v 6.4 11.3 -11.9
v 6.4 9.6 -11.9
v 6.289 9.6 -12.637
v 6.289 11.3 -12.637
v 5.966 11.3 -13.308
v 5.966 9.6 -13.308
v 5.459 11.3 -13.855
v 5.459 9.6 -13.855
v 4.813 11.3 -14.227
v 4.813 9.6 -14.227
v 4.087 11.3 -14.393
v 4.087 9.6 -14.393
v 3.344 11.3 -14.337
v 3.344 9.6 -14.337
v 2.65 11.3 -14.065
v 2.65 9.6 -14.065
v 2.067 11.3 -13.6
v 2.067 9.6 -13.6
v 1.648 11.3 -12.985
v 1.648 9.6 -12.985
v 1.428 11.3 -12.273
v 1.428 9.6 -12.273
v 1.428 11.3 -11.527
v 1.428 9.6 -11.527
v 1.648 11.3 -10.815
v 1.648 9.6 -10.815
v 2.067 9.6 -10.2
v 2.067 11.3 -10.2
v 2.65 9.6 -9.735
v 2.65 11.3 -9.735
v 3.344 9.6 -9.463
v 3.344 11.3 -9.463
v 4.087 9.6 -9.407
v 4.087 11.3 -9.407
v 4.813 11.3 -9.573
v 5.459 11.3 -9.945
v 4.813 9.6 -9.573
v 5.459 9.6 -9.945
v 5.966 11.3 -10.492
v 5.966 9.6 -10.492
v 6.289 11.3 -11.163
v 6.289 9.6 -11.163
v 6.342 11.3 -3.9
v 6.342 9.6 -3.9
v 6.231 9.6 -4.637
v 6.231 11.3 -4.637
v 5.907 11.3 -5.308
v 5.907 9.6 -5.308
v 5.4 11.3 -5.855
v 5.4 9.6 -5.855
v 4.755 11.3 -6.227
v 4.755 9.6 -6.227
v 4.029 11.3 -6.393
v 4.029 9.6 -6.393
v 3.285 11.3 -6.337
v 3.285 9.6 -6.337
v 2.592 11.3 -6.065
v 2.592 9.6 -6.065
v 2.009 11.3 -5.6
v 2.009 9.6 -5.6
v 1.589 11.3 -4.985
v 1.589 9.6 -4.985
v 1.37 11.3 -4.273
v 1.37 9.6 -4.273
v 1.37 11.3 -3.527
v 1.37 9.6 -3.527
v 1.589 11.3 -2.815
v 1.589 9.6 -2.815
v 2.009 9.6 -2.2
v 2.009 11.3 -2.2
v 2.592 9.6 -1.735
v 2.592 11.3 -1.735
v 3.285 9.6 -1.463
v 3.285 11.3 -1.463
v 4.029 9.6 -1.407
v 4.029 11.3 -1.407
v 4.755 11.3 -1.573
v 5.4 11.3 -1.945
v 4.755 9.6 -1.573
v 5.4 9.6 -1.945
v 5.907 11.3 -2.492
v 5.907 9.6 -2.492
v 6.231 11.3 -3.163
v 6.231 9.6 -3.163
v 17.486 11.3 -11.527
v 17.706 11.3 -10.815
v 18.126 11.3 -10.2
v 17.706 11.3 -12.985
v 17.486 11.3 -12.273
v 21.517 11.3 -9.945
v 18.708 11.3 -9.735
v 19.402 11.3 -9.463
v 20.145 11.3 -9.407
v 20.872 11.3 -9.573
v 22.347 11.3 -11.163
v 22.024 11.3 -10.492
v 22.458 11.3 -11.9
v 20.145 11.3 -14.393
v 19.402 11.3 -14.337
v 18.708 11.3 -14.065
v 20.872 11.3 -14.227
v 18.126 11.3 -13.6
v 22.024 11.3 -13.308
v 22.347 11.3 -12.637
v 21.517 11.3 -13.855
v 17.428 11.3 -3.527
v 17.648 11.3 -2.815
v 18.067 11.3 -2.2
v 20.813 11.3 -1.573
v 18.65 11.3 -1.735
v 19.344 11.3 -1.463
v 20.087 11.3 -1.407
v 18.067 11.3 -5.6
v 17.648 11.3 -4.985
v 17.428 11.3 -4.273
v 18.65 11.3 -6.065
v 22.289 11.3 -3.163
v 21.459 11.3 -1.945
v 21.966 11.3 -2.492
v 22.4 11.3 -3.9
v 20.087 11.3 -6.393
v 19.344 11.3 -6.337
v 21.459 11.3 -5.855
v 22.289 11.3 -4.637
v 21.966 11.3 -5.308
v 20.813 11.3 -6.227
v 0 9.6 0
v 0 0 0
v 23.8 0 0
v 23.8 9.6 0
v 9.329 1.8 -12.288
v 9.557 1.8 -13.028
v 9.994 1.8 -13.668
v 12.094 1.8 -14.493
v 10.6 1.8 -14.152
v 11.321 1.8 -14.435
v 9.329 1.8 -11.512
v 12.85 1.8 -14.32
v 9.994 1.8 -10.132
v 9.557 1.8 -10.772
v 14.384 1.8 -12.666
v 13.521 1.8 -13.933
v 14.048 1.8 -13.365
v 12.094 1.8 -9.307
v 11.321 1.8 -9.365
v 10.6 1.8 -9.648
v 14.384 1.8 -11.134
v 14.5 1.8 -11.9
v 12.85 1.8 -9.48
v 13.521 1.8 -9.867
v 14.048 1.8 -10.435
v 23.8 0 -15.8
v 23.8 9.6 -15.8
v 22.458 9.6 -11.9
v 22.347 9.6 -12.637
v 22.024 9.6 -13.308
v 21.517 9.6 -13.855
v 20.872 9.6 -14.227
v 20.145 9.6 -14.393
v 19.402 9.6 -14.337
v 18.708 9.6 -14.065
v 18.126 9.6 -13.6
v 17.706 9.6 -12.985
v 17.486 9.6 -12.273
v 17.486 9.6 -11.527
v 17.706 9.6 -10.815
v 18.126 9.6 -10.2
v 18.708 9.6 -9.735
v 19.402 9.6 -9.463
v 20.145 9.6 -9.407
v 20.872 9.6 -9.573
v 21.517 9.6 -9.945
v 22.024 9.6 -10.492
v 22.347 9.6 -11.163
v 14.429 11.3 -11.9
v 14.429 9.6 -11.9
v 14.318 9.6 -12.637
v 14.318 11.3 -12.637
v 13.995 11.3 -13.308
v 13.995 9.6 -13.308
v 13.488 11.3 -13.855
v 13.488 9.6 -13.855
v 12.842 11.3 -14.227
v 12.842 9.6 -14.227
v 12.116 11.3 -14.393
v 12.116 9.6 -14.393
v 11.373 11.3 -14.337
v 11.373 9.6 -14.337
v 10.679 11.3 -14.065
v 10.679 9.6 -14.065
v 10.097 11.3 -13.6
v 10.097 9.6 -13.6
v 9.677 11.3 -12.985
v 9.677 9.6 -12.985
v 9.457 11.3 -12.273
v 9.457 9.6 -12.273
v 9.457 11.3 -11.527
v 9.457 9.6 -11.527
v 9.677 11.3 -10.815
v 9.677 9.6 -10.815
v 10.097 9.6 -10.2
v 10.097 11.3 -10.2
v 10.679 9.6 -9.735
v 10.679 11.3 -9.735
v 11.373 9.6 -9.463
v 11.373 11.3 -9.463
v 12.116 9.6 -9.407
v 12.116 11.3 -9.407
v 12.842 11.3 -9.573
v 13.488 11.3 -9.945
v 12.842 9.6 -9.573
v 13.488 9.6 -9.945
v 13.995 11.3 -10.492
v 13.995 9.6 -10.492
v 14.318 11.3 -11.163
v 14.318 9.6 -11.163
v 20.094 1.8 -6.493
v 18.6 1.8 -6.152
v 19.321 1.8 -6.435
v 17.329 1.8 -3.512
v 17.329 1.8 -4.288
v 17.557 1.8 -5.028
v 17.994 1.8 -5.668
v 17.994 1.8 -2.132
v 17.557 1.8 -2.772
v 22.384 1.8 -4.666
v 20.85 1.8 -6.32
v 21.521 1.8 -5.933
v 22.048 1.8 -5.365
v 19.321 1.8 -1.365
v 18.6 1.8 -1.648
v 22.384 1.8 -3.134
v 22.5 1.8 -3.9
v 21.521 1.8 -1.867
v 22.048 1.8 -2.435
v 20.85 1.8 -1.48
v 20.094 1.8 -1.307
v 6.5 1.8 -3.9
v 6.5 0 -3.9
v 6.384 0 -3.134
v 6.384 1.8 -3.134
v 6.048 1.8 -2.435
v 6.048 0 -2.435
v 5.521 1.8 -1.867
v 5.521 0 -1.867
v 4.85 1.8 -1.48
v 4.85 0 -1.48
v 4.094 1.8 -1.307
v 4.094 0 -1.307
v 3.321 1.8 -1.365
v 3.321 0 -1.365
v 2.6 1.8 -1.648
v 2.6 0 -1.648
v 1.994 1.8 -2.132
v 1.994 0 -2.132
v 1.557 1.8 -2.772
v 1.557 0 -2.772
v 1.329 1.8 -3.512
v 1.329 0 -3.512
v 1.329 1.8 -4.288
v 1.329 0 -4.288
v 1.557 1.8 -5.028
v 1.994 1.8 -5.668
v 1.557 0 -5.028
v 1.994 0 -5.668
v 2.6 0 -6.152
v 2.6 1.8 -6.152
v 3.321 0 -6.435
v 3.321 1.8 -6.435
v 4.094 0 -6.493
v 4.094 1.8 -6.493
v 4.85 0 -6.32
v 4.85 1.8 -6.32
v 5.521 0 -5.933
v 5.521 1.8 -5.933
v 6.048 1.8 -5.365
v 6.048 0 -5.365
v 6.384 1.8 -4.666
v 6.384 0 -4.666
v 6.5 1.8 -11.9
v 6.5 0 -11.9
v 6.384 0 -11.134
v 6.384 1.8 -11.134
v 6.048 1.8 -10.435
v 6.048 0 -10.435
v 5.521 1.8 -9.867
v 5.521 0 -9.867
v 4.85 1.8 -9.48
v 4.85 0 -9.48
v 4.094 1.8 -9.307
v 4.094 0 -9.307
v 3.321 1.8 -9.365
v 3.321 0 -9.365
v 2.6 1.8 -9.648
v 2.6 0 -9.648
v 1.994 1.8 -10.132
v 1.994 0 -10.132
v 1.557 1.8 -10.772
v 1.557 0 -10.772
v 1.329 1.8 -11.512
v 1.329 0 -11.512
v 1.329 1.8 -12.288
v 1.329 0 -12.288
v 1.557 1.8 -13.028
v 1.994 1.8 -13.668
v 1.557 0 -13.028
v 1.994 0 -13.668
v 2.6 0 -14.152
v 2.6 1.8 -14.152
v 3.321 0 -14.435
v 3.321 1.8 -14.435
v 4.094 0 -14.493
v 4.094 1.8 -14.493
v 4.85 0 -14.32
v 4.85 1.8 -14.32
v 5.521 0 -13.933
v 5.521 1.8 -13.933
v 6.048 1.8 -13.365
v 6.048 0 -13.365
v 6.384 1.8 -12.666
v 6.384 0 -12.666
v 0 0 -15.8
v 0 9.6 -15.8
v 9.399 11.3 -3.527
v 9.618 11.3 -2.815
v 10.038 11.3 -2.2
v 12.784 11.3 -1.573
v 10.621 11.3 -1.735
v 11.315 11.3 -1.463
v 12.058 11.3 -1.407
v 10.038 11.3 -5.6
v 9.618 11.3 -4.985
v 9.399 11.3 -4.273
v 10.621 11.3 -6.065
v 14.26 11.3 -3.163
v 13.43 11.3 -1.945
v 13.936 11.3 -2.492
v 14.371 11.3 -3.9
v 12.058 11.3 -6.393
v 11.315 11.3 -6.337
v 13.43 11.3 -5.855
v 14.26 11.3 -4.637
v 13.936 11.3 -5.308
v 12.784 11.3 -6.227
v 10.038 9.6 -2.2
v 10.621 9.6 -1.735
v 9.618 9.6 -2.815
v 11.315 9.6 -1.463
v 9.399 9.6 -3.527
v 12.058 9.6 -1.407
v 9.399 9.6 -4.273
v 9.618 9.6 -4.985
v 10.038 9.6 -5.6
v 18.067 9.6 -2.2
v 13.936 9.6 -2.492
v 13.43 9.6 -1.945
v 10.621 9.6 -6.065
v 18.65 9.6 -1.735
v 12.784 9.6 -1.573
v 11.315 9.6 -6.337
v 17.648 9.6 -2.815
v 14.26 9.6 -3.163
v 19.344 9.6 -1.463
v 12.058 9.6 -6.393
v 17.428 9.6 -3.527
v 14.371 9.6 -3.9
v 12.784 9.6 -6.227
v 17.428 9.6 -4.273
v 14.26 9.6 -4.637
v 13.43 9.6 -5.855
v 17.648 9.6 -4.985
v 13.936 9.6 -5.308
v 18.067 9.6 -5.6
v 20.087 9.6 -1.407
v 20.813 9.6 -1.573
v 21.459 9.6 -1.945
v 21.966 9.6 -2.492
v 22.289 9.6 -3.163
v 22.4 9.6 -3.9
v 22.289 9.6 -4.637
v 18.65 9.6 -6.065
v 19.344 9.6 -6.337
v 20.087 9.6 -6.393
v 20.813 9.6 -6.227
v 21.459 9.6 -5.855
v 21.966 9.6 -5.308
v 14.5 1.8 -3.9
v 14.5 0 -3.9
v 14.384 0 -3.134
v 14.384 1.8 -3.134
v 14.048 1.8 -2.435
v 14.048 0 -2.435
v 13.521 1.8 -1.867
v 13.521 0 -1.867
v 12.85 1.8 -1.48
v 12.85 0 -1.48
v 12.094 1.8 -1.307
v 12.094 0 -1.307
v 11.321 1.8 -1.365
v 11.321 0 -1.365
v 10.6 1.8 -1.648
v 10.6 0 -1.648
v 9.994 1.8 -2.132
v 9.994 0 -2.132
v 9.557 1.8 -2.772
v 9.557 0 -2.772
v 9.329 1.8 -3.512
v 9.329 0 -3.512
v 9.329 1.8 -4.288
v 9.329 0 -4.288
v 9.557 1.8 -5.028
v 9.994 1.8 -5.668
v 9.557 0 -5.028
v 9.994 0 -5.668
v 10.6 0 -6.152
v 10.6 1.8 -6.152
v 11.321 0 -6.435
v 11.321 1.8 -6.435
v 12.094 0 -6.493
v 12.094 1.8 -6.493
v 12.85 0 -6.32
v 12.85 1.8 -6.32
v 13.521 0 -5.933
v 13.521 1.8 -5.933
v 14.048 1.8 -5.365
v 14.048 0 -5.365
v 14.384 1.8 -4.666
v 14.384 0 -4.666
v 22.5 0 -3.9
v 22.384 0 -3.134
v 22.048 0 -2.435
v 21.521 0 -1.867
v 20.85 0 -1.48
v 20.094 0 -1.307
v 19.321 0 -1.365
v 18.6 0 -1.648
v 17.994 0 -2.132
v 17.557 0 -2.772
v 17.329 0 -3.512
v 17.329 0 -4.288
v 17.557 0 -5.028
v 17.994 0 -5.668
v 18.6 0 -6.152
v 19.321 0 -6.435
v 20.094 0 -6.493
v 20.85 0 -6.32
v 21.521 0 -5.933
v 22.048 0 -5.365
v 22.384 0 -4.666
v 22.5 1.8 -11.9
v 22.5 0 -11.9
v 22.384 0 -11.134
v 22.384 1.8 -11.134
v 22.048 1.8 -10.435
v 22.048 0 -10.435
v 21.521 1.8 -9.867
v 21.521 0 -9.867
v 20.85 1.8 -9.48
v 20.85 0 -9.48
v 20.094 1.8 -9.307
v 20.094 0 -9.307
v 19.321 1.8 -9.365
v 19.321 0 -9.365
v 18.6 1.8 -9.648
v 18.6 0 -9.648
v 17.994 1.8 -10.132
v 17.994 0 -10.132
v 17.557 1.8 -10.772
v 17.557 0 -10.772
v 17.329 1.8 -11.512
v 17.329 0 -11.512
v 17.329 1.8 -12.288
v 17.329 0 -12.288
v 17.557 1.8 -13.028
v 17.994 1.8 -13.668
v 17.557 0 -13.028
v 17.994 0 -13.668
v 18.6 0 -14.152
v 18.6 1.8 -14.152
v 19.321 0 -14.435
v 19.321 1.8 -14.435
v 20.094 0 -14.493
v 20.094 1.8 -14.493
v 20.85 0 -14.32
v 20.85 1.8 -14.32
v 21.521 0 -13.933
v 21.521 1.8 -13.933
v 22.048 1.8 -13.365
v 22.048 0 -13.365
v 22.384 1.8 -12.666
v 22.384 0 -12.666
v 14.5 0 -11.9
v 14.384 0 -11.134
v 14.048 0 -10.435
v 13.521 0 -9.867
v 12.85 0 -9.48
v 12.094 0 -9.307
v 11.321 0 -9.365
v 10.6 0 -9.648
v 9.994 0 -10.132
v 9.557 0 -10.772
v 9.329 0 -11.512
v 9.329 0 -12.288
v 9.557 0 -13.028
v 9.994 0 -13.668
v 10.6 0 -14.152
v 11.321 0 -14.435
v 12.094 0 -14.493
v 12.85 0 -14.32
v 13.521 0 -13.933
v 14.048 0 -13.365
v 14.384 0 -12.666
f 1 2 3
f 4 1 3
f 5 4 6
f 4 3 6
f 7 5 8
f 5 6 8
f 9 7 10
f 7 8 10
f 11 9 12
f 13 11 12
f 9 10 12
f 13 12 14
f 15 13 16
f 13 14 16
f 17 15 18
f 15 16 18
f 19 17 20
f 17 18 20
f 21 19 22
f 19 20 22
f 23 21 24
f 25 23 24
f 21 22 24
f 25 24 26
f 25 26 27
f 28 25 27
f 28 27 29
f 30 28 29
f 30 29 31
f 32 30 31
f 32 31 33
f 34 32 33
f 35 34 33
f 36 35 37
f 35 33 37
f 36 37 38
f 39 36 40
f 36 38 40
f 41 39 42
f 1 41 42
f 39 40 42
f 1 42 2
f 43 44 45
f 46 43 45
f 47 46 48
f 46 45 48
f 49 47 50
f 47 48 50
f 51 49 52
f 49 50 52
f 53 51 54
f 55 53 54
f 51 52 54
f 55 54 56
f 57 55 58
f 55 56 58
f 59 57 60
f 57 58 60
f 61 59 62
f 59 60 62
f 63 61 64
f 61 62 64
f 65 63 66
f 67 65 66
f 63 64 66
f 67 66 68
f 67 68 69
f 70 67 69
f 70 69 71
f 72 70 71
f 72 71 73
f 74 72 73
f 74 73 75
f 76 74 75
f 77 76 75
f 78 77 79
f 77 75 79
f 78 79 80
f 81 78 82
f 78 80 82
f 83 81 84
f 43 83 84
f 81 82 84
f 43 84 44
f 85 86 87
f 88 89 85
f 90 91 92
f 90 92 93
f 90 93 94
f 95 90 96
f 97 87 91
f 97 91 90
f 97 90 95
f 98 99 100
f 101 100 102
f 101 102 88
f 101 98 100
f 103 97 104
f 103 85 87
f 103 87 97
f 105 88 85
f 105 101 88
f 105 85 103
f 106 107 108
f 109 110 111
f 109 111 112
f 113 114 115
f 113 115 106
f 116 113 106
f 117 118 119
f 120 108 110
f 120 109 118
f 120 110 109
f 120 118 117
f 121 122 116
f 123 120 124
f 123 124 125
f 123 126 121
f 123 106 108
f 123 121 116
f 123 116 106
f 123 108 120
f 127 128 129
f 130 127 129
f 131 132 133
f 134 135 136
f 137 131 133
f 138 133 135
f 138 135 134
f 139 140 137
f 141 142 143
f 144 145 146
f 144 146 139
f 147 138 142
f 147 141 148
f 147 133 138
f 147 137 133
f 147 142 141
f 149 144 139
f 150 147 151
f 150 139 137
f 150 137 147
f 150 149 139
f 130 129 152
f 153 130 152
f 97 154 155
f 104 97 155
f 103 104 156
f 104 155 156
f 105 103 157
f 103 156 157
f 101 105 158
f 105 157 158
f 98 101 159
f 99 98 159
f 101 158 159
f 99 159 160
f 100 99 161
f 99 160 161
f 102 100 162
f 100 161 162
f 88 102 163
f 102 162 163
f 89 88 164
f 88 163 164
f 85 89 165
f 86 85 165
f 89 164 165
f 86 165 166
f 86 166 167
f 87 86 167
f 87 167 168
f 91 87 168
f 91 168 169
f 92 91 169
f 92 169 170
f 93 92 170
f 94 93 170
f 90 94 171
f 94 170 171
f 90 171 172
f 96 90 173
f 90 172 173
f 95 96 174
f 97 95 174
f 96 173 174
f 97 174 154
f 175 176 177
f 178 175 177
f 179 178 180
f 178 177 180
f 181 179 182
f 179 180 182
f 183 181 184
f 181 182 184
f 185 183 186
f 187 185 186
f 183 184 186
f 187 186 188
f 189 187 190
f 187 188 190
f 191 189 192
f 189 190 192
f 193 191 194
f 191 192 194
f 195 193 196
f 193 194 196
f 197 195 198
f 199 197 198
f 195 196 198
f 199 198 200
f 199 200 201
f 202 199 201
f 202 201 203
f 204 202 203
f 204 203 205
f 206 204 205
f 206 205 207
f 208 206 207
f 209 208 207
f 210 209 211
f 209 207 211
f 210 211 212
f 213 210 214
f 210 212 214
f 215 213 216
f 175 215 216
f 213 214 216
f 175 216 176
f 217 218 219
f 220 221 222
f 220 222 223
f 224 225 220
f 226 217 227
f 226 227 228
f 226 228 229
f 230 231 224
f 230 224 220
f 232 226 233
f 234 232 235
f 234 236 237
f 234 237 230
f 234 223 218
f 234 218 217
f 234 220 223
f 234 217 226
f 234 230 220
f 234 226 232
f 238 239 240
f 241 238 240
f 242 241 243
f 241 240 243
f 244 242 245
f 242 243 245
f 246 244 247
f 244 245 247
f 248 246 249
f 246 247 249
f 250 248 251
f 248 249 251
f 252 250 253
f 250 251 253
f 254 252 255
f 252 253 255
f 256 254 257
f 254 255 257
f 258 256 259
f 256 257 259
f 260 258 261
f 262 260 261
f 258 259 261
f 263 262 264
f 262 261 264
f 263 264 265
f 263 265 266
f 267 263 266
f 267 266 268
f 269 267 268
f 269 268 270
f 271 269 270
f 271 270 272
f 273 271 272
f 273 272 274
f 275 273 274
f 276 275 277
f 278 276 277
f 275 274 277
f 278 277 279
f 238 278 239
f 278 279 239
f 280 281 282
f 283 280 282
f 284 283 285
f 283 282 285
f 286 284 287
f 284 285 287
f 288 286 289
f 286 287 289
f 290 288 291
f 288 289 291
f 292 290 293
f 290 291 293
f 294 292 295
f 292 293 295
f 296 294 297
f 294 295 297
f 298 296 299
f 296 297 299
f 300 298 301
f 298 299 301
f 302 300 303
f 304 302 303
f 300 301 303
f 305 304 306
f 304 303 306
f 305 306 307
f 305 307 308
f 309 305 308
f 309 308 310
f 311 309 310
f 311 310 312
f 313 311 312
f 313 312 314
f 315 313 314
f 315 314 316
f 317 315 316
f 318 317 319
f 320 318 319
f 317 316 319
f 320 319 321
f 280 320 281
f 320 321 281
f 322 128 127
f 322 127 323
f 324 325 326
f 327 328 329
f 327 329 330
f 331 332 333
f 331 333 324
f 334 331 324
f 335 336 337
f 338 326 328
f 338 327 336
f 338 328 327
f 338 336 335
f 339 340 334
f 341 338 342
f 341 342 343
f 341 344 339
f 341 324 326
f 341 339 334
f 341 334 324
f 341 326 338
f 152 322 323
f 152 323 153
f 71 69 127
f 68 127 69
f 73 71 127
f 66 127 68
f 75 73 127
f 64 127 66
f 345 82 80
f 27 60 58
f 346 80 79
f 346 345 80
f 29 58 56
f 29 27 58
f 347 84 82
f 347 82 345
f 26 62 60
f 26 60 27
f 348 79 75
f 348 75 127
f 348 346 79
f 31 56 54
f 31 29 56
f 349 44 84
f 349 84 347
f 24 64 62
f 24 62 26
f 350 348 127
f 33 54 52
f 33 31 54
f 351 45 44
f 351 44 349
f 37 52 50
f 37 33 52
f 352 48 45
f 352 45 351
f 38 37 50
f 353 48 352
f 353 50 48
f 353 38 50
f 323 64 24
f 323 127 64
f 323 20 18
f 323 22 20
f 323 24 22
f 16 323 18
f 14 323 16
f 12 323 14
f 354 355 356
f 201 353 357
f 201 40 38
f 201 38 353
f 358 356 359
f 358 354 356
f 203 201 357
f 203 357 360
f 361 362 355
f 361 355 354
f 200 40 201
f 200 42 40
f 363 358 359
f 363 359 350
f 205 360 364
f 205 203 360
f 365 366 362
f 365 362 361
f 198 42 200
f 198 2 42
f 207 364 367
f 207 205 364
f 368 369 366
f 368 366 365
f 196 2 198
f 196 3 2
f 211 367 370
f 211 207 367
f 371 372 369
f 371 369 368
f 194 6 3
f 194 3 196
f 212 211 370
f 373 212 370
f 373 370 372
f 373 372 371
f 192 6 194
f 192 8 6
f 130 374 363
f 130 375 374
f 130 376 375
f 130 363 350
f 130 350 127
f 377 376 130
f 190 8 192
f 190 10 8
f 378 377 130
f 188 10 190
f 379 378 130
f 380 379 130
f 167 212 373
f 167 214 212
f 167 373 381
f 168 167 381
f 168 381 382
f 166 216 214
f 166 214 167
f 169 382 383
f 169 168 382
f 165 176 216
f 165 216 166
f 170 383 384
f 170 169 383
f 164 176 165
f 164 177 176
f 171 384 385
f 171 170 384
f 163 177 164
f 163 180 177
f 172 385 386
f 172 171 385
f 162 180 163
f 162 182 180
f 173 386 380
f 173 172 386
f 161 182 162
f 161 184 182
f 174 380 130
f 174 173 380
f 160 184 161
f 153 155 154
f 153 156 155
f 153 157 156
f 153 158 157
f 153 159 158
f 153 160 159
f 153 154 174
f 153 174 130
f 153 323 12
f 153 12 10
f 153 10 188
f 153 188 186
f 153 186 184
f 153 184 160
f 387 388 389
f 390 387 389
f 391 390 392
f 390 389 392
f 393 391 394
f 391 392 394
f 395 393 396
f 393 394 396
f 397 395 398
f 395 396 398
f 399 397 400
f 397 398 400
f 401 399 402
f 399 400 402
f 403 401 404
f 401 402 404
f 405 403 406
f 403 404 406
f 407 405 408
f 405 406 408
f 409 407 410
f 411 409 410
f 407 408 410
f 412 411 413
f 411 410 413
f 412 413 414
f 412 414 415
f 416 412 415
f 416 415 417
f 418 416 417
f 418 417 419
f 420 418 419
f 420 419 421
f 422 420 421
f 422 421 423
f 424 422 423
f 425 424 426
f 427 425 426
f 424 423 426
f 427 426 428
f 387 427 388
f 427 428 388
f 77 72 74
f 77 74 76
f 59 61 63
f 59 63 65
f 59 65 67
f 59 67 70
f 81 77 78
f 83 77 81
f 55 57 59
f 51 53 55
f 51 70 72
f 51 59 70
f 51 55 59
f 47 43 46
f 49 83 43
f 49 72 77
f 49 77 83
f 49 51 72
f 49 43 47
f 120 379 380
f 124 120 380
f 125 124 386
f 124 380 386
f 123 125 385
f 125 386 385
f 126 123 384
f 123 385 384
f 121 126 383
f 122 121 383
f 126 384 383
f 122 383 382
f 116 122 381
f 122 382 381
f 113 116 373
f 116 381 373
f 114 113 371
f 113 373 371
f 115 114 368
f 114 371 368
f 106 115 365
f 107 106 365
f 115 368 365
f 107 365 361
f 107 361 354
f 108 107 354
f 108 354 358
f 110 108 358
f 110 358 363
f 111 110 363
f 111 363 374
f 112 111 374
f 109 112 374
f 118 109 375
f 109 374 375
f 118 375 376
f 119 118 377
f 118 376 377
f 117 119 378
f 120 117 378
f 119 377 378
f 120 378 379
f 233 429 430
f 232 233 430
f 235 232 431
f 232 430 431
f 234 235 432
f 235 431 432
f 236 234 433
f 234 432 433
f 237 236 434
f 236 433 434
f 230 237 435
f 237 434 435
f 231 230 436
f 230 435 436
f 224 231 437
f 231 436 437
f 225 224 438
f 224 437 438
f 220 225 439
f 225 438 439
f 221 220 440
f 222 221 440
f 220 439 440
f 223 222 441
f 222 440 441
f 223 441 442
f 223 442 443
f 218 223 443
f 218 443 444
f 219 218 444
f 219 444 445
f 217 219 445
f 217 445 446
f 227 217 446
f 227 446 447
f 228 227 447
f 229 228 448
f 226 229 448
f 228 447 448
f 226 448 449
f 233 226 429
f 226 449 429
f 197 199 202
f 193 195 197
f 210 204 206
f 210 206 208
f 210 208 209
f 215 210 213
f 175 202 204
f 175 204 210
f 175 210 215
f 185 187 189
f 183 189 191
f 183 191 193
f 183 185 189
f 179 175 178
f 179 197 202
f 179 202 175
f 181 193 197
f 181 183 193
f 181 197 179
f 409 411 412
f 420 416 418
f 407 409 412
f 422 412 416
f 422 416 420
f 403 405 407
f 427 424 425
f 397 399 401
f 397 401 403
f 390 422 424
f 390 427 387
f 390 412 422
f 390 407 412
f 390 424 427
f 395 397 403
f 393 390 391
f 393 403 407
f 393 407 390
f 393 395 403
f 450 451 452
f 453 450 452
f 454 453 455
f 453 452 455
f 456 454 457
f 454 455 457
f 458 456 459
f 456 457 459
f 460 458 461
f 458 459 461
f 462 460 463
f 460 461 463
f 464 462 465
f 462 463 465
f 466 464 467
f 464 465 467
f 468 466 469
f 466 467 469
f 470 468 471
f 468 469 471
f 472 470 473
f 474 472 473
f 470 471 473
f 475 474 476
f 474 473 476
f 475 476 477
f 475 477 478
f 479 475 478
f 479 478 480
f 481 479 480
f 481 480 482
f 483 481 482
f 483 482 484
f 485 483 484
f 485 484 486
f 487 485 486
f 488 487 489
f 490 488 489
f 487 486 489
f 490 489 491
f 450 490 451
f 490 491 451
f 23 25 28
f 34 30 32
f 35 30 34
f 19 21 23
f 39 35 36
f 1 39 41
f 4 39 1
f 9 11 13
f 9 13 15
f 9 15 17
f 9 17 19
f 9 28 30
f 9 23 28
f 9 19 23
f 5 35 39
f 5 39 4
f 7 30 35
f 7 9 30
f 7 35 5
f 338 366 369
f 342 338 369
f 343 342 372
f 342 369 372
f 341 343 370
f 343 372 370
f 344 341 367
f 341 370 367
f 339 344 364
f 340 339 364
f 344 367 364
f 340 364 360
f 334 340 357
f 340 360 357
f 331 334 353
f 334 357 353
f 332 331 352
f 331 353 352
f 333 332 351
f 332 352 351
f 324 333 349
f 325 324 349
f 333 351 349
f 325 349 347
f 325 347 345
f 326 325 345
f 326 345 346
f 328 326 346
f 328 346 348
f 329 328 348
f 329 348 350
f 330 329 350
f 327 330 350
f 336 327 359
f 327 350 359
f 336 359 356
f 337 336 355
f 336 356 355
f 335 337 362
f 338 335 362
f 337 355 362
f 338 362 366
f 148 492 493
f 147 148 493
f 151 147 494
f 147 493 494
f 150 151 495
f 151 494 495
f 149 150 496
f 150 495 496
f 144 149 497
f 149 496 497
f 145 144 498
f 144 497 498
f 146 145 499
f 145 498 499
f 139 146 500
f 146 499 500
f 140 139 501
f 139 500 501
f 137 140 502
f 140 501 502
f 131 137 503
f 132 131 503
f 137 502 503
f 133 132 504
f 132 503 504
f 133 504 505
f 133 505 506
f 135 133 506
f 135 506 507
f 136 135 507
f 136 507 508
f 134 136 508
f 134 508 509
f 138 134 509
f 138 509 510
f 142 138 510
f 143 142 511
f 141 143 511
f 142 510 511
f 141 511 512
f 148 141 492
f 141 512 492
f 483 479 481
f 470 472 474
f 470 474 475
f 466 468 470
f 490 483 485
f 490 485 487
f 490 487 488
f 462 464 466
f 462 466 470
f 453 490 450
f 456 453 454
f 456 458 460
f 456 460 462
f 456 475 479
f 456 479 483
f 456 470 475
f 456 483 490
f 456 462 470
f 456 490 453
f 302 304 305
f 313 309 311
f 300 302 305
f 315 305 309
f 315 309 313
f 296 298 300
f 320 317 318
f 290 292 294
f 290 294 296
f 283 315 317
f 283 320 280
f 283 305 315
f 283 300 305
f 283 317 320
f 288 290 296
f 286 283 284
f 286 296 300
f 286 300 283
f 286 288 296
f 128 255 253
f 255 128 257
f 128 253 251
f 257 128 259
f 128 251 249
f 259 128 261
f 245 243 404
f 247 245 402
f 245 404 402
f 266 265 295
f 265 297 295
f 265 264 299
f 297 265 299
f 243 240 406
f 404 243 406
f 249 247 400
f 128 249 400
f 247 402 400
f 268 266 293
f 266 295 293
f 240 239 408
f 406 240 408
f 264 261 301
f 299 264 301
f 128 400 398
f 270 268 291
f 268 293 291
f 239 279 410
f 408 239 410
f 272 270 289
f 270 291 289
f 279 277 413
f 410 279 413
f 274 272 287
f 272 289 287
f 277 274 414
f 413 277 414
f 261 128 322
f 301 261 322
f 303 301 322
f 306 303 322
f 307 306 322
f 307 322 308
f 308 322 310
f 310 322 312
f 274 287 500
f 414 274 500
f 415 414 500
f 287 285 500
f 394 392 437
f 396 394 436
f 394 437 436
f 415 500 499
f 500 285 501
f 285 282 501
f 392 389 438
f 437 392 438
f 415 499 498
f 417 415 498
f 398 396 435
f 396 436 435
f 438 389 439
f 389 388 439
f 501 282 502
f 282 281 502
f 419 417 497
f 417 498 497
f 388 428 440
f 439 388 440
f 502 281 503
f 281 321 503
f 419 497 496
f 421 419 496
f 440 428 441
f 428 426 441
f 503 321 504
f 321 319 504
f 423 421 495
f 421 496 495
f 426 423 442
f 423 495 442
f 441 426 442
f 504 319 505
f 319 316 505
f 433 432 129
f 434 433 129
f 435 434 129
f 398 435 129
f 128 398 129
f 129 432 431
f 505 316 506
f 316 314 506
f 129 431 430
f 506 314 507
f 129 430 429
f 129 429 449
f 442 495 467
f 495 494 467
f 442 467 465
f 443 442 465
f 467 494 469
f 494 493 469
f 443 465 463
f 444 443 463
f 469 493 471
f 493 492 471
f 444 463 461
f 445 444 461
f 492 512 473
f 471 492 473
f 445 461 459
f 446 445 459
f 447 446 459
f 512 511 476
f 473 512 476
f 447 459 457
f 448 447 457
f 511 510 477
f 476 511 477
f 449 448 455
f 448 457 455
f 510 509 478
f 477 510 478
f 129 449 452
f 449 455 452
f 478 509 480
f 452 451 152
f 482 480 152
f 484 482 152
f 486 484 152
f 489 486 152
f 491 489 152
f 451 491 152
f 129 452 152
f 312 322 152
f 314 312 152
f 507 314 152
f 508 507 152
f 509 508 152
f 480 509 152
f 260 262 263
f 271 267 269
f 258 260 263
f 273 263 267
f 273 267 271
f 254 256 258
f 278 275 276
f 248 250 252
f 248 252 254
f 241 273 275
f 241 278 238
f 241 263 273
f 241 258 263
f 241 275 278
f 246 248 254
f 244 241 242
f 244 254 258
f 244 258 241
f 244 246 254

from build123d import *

# Parameters (mm, degrees)
SKETCH_5_W          = 23.8
SKETCH_5_H          = 15.8
EXTRUDE_2_DEPTH     = 9.6
SKETCH_6_R          = 2.5
EXTRUDE_3_DEPTH     = 1.7
SKETCH_7_R          = 2.6
CUT_EXTRUDE_1_DEPTH = 1.8


with BuildPart() as part:
    # Эскиз5 → Бобышка-Вытянуть2 (new body)
    with BuildSketch(Plane(origin=(0, 0, 0), x_dir=(1, 0, 0), z_dir=(0, 1, 0))):
        with Locations((11.9, 7.9)):
            Rectangle(SKETCH_5_W, SKETCH_5_H)
    extrude(amount=EXTRUDE_2_DEPTH)

    # Эскиз6 → Бобышка-Вытянуть3 (add)
    with BuildSketch(Plane(origin=(0, 9.6, 0), x_dir=(1, 0, 0), z_dir=(0, 1, 0))):
        with Locations((3.9, 11.9)):
            Circle(SKETCH_6_R)
        with Locations((11.929146399, 11.9)):
            Circle(SKETCH_6_R)
        with Locations((19.958292799, 11.9)):
            Circle(SKETCH_6_R)
        with Locations((11.870853601, 3.9)):
            Circle(SKETCH_6_R)
        with Locations((19.9, 3.9)):
            Circle(SKETCH_6_R)
        with Locations((3.841707201, 3.9)):
            Circle(SKETCH_6_R)
    extrude(amount=EXTRUDE_3_DEPTH)

    # Эскиз7 → Вырез-Вытянуть1 (cut)
    with BuildSketch(Plane.XZ):
        with Locations((3.9, -3.9)):
            Circle(SKETCH_7_R)
        with Locations((11.9, -3.9)):
            Circle(SKETCH_7_R)
        with Locations((19.9, -3.9)):
            Circle(SKETCH_7_R)
        with Locations((11.9, -11.9)):
            Circle(SKETCH_7_R)
        with Locations((19.9, -11.9)):
            Circle(SKETCH_7_R)
        with Locations((3.9, -11.9)):
            Circle(SKETCH_7_R)
    extrude(amount=-CUT_EXTRUDE_1_DEPTH, mode=Mode.SUBTRACT)


solid = part.part
